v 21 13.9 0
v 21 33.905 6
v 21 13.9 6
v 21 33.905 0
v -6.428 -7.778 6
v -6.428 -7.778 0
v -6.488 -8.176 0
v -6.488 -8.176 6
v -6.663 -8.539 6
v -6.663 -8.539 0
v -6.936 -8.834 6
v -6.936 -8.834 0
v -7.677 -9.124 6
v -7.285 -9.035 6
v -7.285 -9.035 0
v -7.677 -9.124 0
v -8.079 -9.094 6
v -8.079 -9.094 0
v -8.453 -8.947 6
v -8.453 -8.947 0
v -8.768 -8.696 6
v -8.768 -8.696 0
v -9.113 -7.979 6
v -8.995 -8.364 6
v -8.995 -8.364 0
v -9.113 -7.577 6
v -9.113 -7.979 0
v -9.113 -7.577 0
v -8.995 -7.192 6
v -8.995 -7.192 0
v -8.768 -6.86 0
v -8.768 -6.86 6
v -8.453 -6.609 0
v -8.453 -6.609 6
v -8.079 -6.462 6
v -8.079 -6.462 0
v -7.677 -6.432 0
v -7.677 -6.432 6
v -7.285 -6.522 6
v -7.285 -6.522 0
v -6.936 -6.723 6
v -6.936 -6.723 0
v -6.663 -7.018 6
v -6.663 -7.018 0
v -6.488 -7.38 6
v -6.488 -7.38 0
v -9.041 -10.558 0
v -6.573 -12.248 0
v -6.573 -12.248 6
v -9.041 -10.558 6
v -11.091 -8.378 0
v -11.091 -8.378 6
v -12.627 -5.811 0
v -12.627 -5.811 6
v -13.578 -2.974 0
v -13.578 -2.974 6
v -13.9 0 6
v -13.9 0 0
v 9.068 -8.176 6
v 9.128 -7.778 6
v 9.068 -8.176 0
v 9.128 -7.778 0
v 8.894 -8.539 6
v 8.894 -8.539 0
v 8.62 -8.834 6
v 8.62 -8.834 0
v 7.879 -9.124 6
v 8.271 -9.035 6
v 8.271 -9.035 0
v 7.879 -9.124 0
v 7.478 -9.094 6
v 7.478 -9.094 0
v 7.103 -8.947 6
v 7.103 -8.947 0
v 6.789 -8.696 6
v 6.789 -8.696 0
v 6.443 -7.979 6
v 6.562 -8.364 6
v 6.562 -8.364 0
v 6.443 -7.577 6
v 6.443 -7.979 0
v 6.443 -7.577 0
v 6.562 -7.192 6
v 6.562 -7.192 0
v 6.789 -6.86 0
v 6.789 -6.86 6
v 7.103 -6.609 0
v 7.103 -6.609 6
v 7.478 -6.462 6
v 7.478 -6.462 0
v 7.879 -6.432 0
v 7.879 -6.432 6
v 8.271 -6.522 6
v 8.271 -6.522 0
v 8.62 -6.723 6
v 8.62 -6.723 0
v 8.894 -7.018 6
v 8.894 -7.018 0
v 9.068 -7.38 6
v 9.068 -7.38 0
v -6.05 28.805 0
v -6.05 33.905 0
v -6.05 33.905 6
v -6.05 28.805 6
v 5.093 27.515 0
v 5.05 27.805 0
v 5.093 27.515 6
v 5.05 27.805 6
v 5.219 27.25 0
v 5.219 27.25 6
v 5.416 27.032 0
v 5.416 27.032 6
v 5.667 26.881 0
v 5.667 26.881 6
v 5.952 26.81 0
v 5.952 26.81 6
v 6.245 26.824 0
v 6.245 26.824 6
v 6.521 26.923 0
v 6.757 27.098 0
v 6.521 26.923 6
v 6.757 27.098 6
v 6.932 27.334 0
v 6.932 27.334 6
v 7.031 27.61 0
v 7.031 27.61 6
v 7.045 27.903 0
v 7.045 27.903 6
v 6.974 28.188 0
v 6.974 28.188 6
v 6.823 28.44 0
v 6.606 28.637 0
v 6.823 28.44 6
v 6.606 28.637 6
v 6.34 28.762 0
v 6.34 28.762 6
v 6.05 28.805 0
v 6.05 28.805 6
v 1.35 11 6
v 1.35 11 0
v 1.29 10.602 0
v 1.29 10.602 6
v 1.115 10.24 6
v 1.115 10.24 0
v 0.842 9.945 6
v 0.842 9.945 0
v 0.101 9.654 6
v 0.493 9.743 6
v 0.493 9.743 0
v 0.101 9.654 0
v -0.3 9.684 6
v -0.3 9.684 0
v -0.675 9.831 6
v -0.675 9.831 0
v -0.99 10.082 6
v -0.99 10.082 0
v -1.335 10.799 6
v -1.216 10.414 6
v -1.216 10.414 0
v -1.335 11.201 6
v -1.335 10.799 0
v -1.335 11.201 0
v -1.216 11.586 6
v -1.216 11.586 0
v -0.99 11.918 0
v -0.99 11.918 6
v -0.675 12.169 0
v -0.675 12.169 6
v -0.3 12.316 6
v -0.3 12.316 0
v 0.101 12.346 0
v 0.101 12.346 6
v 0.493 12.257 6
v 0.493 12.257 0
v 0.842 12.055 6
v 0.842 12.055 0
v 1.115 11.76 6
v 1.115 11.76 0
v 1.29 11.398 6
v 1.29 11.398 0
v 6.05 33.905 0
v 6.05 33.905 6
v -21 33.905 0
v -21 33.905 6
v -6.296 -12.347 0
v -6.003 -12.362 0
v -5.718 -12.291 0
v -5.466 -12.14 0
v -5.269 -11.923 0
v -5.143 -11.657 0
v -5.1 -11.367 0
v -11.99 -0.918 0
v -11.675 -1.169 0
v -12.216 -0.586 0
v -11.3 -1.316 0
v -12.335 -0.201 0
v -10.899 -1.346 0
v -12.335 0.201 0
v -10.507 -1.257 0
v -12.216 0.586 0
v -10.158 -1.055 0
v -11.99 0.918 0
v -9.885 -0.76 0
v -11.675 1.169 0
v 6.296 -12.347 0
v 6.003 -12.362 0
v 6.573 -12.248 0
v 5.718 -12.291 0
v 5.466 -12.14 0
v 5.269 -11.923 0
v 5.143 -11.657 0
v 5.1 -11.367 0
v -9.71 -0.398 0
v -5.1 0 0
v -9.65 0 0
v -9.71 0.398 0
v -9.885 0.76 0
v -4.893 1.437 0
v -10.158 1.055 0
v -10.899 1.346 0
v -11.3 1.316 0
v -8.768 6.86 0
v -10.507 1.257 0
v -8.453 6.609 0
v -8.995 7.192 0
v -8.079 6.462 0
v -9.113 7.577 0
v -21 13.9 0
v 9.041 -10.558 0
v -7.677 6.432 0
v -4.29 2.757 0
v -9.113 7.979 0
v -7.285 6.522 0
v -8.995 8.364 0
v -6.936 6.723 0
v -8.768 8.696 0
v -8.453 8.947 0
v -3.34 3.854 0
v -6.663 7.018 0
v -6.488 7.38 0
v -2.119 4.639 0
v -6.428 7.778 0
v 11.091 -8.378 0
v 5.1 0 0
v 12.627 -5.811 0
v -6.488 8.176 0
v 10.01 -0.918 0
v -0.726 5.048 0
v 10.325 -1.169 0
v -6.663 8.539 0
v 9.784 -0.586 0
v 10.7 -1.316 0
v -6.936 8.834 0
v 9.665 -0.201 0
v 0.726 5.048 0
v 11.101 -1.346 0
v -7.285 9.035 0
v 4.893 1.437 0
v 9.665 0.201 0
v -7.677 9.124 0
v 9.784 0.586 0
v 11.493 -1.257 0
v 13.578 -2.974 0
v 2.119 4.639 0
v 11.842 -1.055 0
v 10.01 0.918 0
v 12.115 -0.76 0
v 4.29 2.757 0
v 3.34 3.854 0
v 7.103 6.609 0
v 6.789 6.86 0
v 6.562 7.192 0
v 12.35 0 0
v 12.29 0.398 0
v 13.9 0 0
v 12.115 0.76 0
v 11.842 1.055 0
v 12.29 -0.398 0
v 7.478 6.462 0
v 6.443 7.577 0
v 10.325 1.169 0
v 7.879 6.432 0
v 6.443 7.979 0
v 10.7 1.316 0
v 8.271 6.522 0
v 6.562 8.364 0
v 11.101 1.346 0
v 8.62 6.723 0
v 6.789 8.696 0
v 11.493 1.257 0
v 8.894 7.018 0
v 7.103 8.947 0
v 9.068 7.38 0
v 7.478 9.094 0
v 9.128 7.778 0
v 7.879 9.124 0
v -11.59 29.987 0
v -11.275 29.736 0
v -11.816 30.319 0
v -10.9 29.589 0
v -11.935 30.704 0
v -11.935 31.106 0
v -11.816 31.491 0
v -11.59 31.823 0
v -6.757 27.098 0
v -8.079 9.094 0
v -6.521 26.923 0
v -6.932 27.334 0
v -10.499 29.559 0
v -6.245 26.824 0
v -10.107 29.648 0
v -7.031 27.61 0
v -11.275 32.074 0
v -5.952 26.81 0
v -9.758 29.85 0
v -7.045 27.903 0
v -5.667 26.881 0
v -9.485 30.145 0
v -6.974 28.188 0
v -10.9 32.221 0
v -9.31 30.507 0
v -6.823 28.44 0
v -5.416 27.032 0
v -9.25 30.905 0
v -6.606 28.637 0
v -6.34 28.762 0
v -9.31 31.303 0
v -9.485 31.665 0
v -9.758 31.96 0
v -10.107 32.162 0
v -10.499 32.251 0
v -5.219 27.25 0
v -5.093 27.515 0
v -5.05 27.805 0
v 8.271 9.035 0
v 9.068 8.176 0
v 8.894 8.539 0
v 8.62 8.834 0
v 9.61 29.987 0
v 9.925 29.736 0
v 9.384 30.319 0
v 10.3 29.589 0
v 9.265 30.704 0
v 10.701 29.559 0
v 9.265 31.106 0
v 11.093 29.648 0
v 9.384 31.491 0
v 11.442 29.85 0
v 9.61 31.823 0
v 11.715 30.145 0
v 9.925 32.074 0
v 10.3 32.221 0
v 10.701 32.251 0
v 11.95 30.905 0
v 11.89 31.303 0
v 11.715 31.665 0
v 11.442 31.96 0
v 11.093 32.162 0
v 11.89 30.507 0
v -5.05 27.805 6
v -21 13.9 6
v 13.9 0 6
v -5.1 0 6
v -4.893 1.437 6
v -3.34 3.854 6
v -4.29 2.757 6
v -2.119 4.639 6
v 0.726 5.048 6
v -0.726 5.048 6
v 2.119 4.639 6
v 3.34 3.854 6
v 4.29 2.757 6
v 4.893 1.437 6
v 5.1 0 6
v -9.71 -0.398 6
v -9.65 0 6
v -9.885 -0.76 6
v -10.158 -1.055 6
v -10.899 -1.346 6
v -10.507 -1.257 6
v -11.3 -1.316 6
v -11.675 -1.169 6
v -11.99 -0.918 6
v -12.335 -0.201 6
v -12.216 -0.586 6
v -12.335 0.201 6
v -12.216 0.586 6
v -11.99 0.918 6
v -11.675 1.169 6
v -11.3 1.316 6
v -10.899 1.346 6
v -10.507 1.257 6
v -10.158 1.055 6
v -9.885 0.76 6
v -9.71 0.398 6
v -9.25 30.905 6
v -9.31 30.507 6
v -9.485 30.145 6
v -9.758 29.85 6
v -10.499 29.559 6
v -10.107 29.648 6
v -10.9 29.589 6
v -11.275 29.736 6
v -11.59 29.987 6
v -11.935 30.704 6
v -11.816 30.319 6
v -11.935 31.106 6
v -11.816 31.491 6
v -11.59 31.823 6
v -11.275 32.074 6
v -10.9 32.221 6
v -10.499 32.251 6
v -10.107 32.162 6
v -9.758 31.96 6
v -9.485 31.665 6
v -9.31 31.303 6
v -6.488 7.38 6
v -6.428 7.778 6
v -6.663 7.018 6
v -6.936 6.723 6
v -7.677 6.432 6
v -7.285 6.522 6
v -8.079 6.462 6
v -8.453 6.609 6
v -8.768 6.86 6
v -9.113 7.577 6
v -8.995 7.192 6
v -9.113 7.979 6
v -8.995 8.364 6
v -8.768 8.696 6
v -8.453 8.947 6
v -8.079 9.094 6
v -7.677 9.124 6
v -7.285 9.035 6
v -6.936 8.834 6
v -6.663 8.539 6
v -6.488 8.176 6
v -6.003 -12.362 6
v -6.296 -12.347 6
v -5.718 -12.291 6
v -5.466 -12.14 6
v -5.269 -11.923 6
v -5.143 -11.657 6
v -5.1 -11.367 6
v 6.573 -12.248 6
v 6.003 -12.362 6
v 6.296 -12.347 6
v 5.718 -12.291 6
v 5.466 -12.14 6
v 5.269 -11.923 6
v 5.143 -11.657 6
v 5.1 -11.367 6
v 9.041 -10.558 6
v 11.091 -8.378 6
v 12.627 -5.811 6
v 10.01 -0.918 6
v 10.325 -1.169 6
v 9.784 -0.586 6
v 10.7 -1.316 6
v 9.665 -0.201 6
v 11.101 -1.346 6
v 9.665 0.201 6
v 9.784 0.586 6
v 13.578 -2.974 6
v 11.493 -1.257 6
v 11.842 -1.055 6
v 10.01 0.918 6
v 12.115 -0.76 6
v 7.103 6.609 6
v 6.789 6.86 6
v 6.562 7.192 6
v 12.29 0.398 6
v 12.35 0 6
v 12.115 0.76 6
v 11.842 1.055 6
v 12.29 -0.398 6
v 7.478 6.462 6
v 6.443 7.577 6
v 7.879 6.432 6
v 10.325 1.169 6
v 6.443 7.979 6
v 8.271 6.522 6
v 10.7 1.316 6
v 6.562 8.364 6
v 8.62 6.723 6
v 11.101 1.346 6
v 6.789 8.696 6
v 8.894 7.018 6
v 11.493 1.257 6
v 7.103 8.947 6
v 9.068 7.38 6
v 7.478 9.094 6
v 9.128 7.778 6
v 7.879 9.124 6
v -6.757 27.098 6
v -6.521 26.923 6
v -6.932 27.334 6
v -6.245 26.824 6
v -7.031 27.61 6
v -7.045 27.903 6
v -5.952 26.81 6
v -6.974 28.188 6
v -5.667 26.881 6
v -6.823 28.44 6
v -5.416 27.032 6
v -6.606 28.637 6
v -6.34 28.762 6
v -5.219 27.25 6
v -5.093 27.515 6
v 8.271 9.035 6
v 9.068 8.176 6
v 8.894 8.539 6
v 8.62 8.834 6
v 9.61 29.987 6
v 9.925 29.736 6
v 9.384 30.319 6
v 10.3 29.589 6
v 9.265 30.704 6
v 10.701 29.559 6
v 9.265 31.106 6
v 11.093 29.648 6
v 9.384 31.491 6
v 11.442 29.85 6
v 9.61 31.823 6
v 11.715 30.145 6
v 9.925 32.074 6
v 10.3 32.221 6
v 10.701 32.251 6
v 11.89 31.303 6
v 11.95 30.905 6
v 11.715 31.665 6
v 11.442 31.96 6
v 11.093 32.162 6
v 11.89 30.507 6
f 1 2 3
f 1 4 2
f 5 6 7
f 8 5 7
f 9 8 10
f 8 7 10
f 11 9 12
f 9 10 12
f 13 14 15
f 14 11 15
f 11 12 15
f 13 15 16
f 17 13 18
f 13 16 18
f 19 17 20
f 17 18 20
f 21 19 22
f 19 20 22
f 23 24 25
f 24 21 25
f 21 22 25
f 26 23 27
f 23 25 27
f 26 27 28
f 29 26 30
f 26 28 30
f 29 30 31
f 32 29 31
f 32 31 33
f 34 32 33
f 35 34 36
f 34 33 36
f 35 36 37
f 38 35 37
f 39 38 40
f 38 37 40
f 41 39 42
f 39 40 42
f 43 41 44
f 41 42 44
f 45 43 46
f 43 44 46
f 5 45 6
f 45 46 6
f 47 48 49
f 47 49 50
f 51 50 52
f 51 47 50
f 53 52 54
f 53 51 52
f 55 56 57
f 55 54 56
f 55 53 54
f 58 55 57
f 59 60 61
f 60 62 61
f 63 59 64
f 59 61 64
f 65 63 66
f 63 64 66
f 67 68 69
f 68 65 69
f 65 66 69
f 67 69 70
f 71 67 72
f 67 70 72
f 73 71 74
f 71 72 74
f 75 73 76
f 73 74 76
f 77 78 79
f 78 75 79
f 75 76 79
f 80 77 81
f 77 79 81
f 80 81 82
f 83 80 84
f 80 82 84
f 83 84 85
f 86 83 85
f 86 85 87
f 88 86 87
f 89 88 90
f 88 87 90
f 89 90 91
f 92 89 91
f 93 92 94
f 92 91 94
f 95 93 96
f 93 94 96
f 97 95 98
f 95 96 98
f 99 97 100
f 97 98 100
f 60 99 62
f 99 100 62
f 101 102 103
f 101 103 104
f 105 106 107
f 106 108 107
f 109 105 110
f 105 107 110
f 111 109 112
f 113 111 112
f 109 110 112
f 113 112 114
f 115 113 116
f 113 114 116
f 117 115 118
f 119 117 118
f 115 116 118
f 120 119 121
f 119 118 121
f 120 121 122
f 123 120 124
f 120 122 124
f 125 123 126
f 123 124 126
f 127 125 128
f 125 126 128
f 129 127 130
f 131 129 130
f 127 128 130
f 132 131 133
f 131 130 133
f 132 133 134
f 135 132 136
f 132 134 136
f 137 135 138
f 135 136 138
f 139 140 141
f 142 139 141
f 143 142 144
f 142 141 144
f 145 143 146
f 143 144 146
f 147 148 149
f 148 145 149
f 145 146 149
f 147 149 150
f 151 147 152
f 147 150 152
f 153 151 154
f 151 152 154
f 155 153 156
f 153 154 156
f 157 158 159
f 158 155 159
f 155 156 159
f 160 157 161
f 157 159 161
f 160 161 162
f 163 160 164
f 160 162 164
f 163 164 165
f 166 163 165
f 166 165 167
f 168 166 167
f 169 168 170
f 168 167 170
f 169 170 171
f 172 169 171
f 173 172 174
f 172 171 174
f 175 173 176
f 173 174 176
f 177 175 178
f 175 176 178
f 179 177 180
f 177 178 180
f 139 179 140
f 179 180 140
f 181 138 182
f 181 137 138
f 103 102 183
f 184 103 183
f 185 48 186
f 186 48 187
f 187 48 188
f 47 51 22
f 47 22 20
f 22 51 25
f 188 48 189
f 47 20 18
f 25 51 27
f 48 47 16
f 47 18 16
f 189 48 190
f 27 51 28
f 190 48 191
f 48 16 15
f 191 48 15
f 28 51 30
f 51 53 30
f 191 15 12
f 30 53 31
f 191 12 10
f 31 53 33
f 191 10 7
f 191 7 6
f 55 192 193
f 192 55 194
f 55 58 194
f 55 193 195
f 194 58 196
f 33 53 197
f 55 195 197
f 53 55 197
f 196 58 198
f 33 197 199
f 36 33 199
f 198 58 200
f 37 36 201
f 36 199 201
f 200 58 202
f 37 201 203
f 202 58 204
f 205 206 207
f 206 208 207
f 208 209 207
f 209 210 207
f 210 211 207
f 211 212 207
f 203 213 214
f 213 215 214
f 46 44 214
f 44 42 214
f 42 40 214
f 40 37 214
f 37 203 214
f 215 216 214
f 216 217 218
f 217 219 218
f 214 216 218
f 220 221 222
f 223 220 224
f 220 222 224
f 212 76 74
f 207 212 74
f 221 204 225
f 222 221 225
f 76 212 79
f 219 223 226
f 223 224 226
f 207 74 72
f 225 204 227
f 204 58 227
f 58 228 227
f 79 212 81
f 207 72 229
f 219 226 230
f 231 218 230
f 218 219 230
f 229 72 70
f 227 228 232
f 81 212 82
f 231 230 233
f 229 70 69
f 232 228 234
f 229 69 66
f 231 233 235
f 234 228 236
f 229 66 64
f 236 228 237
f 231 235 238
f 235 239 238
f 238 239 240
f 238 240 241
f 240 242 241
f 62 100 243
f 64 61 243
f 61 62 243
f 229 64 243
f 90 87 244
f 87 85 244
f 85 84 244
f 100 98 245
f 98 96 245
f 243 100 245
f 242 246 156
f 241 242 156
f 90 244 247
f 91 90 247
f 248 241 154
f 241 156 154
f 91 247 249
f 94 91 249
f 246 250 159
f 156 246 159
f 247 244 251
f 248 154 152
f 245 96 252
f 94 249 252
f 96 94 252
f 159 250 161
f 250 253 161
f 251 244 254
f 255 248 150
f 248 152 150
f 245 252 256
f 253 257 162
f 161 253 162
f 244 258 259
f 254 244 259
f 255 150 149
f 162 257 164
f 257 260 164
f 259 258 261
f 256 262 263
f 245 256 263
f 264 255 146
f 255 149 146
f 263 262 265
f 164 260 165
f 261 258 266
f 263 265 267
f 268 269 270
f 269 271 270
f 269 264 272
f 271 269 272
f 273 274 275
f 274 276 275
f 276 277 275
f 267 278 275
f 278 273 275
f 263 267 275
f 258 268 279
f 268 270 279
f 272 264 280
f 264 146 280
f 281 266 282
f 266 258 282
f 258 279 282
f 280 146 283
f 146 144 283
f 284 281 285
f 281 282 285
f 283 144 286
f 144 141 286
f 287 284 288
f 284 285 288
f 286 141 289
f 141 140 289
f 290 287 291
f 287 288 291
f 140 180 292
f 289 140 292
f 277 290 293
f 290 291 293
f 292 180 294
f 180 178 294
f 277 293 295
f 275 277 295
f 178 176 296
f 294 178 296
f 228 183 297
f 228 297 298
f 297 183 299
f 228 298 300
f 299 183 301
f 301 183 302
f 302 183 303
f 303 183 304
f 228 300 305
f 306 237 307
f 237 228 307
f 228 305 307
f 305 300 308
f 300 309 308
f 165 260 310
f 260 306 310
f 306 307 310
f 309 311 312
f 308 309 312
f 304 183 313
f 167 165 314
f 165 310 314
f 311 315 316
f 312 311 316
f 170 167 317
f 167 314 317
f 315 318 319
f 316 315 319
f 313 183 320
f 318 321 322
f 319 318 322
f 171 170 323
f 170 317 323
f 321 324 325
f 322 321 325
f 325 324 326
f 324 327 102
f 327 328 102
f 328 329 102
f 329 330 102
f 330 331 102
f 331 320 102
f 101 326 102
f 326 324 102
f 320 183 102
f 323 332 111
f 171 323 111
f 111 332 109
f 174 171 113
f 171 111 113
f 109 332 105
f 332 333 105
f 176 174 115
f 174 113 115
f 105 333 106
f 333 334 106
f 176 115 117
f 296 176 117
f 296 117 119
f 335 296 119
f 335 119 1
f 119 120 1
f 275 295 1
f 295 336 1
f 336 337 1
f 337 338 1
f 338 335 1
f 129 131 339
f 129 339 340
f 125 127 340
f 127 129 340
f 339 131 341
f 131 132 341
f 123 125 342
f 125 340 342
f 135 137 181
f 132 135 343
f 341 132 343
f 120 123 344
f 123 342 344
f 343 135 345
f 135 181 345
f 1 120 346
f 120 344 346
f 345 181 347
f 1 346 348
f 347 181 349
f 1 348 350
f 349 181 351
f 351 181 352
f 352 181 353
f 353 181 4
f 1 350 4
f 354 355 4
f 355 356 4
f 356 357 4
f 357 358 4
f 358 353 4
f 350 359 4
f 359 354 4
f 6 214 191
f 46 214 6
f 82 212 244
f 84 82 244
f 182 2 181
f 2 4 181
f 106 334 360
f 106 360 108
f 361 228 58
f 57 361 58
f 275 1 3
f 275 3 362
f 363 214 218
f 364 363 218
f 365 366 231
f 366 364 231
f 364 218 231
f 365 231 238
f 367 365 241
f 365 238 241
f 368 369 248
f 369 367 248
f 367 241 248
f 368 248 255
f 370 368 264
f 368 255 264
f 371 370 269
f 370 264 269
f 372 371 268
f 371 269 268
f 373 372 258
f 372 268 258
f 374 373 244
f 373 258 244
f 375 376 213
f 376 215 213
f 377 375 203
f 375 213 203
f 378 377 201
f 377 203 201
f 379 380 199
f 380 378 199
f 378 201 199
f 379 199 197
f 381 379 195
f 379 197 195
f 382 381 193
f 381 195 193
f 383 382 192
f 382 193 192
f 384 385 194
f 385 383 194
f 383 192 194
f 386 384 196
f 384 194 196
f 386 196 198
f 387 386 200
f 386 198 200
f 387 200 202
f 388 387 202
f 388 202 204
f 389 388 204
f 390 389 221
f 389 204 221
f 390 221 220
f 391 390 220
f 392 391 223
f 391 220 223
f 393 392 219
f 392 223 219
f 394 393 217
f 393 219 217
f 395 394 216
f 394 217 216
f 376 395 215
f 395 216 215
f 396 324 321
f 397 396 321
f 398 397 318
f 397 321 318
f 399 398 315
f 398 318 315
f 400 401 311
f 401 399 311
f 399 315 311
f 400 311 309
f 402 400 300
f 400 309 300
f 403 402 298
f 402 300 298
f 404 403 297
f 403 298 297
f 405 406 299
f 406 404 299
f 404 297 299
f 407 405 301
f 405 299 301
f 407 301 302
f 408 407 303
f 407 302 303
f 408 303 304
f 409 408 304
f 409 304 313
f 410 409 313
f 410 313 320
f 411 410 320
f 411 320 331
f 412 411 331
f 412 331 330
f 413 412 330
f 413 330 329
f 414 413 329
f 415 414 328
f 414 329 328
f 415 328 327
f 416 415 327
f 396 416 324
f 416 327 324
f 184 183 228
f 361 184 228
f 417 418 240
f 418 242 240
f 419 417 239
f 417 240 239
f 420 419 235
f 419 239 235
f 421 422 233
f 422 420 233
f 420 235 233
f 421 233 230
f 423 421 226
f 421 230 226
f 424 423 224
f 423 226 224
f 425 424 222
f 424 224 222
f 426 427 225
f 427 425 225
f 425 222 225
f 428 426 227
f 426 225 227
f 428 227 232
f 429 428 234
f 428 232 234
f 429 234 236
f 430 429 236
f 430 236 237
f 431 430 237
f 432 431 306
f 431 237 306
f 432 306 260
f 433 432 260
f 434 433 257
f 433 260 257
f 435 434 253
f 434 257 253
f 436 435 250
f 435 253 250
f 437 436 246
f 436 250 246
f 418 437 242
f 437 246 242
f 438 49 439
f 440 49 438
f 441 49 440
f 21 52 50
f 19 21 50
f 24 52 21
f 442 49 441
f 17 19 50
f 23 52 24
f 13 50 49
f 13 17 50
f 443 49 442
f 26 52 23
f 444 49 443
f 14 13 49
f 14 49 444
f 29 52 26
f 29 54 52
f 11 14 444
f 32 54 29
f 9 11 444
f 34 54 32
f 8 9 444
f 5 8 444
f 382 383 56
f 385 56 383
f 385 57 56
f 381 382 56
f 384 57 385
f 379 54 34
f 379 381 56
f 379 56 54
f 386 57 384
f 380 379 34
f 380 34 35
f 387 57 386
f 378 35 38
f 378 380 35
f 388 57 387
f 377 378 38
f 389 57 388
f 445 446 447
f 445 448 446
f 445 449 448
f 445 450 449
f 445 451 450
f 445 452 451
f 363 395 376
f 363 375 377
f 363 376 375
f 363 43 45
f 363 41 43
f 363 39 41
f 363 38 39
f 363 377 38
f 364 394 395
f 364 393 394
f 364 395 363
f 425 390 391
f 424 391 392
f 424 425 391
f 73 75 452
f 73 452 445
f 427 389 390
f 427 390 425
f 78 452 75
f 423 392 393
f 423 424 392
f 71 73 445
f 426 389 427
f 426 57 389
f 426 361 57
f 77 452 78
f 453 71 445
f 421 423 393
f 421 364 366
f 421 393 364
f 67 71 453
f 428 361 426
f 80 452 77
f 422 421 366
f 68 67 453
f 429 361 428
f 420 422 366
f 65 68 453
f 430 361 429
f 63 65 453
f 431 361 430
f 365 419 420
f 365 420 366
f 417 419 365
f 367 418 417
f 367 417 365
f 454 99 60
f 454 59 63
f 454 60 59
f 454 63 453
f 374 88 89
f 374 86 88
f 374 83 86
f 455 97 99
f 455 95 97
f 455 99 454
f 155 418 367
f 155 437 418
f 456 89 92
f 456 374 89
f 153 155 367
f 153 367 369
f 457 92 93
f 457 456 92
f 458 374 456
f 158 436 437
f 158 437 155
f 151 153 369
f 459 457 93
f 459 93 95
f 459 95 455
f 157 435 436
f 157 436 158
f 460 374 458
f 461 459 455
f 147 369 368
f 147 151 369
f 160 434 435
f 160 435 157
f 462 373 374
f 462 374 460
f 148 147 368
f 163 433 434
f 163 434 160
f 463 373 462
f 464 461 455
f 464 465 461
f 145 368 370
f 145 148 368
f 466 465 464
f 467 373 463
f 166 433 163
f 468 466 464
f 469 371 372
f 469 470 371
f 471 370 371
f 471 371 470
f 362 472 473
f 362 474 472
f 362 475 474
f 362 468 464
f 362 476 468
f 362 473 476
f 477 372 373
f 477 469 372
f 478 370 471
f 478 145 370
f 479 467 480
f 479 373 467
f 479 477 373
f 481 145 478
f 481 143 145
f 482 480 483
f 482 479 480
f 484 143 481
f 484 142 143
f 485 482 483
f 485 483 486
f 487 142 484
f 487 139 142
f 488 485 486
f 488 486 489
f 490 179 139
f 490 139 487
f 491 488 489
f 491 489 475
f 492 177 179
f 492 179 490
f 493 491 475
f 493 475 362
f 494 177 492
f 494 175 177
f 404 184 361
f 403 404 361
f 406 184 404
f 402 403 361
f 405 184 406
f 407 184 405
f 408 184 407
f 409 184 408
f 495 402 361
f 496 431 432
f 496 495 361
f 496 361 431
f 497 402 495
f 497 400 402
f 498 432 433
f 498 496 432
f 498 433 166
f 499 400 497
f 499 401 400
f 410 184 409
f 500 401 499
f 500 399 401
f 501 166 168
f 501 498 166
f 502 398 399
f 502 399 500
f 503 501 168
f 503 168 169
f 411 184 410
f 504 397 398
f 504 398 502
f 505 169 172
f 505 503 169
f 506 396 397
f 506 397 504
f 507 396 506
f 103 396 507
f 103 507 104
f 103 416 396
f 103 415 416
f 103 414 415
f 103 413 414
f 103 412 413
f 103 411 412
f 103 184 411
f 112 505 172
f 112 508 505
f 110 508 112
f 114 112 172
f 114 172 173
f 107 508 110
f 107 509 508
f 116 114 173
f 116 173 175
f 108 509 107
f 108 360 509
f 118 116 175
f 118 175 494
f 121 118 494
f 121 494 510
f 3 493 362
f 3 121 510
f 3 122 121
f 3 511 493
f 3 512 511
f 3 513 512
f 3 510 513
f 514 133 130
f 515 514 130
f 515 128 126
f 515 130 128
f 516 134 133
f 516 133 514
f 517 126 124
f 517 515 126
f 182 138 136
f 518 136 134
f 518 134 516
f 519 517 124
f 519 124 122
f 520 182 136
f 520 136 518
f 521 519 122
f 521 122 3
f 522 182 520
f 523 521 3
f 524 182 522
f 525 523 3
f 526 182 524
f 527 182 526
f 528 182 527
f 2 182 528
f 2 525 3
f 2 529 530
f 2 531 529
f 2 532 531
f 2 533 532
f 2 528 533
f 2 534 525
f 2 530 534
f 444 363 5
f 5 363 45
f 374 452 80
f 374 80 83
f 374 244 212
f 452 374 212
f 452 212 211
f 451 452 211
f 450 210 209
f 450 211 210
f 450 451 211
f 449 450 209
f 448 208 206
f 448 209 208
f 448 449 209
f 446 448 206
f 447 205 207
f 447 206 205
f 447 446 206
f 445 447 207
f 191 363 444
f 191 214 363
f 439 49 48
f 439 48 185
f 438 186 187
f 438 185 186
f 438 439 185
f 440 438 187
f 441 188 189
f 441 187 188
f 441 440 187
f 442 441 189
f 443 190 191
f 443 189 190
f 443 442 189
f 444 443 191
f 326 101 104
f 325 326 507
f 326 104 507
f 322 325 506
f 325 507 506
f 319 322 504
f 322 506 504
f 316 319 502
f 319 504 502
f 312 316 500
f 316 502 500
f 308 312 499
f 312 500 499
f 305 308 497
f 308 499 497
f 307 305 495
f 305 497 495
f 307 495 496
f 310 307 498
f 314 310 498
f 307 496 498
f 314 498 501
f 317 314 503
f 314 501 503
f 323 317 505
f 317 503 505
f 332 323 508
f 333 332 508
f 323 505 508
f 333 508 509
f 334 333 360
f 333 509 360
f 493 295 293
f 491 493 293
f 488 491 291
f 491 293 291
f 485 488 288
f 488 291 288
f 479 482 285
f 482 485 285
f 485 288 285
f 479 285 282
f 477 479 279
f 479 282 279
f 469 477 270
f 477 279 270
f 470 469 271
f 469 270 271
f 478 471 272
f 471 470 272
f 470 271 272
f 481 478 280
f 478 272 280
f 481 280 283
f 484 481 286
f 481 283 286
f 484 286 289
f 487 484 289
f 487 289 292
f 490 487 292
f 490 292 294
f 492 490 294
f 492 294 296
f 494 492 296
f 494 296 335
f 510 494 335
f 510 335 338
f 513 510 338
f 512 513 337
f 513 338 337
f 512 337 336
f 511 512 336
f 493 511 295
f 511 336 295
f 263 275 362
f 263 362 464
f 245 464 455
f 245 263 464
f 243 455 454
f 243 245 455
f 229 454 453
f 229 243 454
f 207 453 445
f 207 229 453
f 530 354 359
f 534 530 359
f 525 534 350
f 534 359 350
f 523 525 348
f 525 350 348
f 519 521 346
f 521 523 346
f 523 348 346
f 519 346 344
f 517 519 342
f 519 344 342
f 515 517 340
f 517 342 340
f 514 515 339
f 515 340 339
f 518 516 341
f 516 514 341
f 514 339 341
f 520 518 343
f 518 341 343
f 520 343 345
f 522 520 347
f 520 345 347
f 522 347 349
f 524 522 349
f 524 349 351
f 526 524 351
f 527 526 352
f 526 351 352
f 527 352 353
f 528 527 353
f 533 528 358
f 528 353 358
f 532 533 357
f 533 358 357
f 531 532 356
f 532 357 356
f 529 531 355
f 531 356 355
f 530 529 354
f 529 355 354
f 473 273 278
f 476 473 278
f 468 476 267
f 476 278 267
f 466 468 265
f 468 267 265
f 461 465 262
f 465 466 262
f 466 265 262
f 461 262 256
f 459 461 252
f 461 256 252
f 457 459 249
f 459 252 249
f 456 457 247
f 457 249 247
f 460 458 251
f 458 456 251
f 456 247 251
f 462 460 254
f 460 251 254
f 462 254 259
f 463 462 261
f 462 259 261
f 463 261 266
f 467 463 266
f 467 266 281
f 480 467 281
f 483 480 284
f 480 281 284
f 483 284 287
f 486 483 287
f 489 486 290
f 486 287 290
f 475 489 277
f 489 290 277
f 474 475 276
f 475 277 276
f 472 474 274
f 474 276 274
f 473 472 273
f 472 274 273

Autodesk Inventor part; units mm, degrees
ref_plane "YZ Plane" through (0, 0, 0) normal (1, 0, 0) x (0, 1, 0)
ref_plane "XZ Plane" through (0, 0, 0) normal (0, 1, 0) x (-1, 0, 0)
ref_plane "XY Plane" through (0, 0, 0) normal (0, 0, 1) x (1, 0, 0)
ref_plane "작업 평면1" through (0, 0, 0) normal (0, 0, 1) x (1, 0, 0)
sketch "스케치1" plane through (0, 0, 0) normal (0, 0, 1) x (1, 0, 0)
  circle A0 centre (-7.7782, -7.7782) radius 1.55 projected
  circle A1 centre (7.7782, -7.7782) radius 1.55 projected
  circle A2 centre (7.7782, 7.7782) radius 1.55 projected
  circle A3 centre (-7.7782, 7.7782) radius 1.55 projected
  circle A4 centre (0, 0) radius 5 projected
  circle A5 centre (0, 0) radius 13.9 projected
  circle A6 centre (0, 11) radius 1.55 projected
  circle A7 centre (11, 0) radius 1.55 projected
  circle A8 centre (0, -11) radius 1.55 projected
  circle A9 centre (-11, 0) radius 1.55 projected
  circle A10 centre (11, 0) radius 1.35
  circle A11 centre (7.7782, 7.7782) radius 1.35
  circle A12 centre (0, 11) radius 1.35
  circle A13 centre (-7.7782, 7.7782) radius 1.35
  circle A14 centre (-11, 0) radius 1.35
  circle A15 centre (-7.7782, -7.7782) radius 1.35
  circle A16 centre (0, -11) radius 1.35
  circle A17 centre (7.7782, -7.7782) radius 1.35
  line L0 (13.9, 33.9052) -> (-13.9, 33.9052)
  line L1 (-3.1, 33.9052) -> (3.1, 33.9052)
  circle A18 centre (0, 0) radius 5.1
  circle A19 centre (0, 0) radius 13.9
  line L2 (-5.1, 0) -> (-5.1, -12.9306)
  line L3 (5.1, 0) -> (5.1, -12.9306)
  line L4 (13.9, 33.9052) -> (21, 33.9052)
  line L5 (21, 33.9052) -> (21, 13.9)
  line L6 (13.9, 13.9) -> (13.9, 13.9052)
  line L7 (-13.9, 33.9052) -> (-21, 33.9052)
  line L8 (-21, 33.9052) -> (-21, 13.9)
  line L9 (21, 13.9) -> (13.9, 0)
  line L10 (-21, 13.9) -> (-13.9, 0)
  line L11 (6.05, 33.9052) -> (-6.05, 33.9052)
  line L12 (-6.05, 33.9052) -> (-6.05, 27.8052)
  line L13 (-6.05, 27.8052) -> (6.05, 27.8052)
  line L14 (6.05, 27.8052) -> (6.05, 33.9052)
  circle A20 centre (10.6, 30.905) radius 1.35
  circle A21 centre (-10.6, 30.905) radius 1.35
  point P0 (13.9, 0)
  dimension "d1" = 2.7
  dimension "d4" = 360
  dimension "d34" = 0.1
  dimension "d37" = 12.1
  dimension "d38" = 6.1
  dimension "d44" = 2.7
  dimension "d45" = 2.7
extrude "돌출8" add sketch "스케치1" along normal blind 6 contours A0 | A1 | A2 | A3 | A5 L3 A18 L2 | A5 L10 L8 L7 L0 L12 L13 L14 L4 L5 L9 | A6 | A7 | A9 picked at (-7.5104, -2.4224)
fillet "모깎기2" radius 1 2 edges at (5.1, -12.9306, 3) (-5.1, -12.9306, 3)
sketch "스케치3" plane through (0, 0, 6) normal (0, 0, 1) x (1, 0, 0)
  line L0 (-6.05, 27.8052) -> (-6.05, 33.9052) projected
  line L1 (6.05, 27.8052) -> (-6.05, 27.8052) projected
  line L2 (6.05, 33.9052) -> (6.05, 27.8052) projected
  circle A0 centre (-6.05, 27.8052) radius 1
  circle A1 centre (6.05, 27.8052) radius 1
  point P0 (0, 0)
  dimension "d49" = 2
  dimension "d50" = 2
extrude "돌출9" cut sketch "스케치3" against normal blind 10
properties part number "leg_between" material "PMMA 플라스틱"
